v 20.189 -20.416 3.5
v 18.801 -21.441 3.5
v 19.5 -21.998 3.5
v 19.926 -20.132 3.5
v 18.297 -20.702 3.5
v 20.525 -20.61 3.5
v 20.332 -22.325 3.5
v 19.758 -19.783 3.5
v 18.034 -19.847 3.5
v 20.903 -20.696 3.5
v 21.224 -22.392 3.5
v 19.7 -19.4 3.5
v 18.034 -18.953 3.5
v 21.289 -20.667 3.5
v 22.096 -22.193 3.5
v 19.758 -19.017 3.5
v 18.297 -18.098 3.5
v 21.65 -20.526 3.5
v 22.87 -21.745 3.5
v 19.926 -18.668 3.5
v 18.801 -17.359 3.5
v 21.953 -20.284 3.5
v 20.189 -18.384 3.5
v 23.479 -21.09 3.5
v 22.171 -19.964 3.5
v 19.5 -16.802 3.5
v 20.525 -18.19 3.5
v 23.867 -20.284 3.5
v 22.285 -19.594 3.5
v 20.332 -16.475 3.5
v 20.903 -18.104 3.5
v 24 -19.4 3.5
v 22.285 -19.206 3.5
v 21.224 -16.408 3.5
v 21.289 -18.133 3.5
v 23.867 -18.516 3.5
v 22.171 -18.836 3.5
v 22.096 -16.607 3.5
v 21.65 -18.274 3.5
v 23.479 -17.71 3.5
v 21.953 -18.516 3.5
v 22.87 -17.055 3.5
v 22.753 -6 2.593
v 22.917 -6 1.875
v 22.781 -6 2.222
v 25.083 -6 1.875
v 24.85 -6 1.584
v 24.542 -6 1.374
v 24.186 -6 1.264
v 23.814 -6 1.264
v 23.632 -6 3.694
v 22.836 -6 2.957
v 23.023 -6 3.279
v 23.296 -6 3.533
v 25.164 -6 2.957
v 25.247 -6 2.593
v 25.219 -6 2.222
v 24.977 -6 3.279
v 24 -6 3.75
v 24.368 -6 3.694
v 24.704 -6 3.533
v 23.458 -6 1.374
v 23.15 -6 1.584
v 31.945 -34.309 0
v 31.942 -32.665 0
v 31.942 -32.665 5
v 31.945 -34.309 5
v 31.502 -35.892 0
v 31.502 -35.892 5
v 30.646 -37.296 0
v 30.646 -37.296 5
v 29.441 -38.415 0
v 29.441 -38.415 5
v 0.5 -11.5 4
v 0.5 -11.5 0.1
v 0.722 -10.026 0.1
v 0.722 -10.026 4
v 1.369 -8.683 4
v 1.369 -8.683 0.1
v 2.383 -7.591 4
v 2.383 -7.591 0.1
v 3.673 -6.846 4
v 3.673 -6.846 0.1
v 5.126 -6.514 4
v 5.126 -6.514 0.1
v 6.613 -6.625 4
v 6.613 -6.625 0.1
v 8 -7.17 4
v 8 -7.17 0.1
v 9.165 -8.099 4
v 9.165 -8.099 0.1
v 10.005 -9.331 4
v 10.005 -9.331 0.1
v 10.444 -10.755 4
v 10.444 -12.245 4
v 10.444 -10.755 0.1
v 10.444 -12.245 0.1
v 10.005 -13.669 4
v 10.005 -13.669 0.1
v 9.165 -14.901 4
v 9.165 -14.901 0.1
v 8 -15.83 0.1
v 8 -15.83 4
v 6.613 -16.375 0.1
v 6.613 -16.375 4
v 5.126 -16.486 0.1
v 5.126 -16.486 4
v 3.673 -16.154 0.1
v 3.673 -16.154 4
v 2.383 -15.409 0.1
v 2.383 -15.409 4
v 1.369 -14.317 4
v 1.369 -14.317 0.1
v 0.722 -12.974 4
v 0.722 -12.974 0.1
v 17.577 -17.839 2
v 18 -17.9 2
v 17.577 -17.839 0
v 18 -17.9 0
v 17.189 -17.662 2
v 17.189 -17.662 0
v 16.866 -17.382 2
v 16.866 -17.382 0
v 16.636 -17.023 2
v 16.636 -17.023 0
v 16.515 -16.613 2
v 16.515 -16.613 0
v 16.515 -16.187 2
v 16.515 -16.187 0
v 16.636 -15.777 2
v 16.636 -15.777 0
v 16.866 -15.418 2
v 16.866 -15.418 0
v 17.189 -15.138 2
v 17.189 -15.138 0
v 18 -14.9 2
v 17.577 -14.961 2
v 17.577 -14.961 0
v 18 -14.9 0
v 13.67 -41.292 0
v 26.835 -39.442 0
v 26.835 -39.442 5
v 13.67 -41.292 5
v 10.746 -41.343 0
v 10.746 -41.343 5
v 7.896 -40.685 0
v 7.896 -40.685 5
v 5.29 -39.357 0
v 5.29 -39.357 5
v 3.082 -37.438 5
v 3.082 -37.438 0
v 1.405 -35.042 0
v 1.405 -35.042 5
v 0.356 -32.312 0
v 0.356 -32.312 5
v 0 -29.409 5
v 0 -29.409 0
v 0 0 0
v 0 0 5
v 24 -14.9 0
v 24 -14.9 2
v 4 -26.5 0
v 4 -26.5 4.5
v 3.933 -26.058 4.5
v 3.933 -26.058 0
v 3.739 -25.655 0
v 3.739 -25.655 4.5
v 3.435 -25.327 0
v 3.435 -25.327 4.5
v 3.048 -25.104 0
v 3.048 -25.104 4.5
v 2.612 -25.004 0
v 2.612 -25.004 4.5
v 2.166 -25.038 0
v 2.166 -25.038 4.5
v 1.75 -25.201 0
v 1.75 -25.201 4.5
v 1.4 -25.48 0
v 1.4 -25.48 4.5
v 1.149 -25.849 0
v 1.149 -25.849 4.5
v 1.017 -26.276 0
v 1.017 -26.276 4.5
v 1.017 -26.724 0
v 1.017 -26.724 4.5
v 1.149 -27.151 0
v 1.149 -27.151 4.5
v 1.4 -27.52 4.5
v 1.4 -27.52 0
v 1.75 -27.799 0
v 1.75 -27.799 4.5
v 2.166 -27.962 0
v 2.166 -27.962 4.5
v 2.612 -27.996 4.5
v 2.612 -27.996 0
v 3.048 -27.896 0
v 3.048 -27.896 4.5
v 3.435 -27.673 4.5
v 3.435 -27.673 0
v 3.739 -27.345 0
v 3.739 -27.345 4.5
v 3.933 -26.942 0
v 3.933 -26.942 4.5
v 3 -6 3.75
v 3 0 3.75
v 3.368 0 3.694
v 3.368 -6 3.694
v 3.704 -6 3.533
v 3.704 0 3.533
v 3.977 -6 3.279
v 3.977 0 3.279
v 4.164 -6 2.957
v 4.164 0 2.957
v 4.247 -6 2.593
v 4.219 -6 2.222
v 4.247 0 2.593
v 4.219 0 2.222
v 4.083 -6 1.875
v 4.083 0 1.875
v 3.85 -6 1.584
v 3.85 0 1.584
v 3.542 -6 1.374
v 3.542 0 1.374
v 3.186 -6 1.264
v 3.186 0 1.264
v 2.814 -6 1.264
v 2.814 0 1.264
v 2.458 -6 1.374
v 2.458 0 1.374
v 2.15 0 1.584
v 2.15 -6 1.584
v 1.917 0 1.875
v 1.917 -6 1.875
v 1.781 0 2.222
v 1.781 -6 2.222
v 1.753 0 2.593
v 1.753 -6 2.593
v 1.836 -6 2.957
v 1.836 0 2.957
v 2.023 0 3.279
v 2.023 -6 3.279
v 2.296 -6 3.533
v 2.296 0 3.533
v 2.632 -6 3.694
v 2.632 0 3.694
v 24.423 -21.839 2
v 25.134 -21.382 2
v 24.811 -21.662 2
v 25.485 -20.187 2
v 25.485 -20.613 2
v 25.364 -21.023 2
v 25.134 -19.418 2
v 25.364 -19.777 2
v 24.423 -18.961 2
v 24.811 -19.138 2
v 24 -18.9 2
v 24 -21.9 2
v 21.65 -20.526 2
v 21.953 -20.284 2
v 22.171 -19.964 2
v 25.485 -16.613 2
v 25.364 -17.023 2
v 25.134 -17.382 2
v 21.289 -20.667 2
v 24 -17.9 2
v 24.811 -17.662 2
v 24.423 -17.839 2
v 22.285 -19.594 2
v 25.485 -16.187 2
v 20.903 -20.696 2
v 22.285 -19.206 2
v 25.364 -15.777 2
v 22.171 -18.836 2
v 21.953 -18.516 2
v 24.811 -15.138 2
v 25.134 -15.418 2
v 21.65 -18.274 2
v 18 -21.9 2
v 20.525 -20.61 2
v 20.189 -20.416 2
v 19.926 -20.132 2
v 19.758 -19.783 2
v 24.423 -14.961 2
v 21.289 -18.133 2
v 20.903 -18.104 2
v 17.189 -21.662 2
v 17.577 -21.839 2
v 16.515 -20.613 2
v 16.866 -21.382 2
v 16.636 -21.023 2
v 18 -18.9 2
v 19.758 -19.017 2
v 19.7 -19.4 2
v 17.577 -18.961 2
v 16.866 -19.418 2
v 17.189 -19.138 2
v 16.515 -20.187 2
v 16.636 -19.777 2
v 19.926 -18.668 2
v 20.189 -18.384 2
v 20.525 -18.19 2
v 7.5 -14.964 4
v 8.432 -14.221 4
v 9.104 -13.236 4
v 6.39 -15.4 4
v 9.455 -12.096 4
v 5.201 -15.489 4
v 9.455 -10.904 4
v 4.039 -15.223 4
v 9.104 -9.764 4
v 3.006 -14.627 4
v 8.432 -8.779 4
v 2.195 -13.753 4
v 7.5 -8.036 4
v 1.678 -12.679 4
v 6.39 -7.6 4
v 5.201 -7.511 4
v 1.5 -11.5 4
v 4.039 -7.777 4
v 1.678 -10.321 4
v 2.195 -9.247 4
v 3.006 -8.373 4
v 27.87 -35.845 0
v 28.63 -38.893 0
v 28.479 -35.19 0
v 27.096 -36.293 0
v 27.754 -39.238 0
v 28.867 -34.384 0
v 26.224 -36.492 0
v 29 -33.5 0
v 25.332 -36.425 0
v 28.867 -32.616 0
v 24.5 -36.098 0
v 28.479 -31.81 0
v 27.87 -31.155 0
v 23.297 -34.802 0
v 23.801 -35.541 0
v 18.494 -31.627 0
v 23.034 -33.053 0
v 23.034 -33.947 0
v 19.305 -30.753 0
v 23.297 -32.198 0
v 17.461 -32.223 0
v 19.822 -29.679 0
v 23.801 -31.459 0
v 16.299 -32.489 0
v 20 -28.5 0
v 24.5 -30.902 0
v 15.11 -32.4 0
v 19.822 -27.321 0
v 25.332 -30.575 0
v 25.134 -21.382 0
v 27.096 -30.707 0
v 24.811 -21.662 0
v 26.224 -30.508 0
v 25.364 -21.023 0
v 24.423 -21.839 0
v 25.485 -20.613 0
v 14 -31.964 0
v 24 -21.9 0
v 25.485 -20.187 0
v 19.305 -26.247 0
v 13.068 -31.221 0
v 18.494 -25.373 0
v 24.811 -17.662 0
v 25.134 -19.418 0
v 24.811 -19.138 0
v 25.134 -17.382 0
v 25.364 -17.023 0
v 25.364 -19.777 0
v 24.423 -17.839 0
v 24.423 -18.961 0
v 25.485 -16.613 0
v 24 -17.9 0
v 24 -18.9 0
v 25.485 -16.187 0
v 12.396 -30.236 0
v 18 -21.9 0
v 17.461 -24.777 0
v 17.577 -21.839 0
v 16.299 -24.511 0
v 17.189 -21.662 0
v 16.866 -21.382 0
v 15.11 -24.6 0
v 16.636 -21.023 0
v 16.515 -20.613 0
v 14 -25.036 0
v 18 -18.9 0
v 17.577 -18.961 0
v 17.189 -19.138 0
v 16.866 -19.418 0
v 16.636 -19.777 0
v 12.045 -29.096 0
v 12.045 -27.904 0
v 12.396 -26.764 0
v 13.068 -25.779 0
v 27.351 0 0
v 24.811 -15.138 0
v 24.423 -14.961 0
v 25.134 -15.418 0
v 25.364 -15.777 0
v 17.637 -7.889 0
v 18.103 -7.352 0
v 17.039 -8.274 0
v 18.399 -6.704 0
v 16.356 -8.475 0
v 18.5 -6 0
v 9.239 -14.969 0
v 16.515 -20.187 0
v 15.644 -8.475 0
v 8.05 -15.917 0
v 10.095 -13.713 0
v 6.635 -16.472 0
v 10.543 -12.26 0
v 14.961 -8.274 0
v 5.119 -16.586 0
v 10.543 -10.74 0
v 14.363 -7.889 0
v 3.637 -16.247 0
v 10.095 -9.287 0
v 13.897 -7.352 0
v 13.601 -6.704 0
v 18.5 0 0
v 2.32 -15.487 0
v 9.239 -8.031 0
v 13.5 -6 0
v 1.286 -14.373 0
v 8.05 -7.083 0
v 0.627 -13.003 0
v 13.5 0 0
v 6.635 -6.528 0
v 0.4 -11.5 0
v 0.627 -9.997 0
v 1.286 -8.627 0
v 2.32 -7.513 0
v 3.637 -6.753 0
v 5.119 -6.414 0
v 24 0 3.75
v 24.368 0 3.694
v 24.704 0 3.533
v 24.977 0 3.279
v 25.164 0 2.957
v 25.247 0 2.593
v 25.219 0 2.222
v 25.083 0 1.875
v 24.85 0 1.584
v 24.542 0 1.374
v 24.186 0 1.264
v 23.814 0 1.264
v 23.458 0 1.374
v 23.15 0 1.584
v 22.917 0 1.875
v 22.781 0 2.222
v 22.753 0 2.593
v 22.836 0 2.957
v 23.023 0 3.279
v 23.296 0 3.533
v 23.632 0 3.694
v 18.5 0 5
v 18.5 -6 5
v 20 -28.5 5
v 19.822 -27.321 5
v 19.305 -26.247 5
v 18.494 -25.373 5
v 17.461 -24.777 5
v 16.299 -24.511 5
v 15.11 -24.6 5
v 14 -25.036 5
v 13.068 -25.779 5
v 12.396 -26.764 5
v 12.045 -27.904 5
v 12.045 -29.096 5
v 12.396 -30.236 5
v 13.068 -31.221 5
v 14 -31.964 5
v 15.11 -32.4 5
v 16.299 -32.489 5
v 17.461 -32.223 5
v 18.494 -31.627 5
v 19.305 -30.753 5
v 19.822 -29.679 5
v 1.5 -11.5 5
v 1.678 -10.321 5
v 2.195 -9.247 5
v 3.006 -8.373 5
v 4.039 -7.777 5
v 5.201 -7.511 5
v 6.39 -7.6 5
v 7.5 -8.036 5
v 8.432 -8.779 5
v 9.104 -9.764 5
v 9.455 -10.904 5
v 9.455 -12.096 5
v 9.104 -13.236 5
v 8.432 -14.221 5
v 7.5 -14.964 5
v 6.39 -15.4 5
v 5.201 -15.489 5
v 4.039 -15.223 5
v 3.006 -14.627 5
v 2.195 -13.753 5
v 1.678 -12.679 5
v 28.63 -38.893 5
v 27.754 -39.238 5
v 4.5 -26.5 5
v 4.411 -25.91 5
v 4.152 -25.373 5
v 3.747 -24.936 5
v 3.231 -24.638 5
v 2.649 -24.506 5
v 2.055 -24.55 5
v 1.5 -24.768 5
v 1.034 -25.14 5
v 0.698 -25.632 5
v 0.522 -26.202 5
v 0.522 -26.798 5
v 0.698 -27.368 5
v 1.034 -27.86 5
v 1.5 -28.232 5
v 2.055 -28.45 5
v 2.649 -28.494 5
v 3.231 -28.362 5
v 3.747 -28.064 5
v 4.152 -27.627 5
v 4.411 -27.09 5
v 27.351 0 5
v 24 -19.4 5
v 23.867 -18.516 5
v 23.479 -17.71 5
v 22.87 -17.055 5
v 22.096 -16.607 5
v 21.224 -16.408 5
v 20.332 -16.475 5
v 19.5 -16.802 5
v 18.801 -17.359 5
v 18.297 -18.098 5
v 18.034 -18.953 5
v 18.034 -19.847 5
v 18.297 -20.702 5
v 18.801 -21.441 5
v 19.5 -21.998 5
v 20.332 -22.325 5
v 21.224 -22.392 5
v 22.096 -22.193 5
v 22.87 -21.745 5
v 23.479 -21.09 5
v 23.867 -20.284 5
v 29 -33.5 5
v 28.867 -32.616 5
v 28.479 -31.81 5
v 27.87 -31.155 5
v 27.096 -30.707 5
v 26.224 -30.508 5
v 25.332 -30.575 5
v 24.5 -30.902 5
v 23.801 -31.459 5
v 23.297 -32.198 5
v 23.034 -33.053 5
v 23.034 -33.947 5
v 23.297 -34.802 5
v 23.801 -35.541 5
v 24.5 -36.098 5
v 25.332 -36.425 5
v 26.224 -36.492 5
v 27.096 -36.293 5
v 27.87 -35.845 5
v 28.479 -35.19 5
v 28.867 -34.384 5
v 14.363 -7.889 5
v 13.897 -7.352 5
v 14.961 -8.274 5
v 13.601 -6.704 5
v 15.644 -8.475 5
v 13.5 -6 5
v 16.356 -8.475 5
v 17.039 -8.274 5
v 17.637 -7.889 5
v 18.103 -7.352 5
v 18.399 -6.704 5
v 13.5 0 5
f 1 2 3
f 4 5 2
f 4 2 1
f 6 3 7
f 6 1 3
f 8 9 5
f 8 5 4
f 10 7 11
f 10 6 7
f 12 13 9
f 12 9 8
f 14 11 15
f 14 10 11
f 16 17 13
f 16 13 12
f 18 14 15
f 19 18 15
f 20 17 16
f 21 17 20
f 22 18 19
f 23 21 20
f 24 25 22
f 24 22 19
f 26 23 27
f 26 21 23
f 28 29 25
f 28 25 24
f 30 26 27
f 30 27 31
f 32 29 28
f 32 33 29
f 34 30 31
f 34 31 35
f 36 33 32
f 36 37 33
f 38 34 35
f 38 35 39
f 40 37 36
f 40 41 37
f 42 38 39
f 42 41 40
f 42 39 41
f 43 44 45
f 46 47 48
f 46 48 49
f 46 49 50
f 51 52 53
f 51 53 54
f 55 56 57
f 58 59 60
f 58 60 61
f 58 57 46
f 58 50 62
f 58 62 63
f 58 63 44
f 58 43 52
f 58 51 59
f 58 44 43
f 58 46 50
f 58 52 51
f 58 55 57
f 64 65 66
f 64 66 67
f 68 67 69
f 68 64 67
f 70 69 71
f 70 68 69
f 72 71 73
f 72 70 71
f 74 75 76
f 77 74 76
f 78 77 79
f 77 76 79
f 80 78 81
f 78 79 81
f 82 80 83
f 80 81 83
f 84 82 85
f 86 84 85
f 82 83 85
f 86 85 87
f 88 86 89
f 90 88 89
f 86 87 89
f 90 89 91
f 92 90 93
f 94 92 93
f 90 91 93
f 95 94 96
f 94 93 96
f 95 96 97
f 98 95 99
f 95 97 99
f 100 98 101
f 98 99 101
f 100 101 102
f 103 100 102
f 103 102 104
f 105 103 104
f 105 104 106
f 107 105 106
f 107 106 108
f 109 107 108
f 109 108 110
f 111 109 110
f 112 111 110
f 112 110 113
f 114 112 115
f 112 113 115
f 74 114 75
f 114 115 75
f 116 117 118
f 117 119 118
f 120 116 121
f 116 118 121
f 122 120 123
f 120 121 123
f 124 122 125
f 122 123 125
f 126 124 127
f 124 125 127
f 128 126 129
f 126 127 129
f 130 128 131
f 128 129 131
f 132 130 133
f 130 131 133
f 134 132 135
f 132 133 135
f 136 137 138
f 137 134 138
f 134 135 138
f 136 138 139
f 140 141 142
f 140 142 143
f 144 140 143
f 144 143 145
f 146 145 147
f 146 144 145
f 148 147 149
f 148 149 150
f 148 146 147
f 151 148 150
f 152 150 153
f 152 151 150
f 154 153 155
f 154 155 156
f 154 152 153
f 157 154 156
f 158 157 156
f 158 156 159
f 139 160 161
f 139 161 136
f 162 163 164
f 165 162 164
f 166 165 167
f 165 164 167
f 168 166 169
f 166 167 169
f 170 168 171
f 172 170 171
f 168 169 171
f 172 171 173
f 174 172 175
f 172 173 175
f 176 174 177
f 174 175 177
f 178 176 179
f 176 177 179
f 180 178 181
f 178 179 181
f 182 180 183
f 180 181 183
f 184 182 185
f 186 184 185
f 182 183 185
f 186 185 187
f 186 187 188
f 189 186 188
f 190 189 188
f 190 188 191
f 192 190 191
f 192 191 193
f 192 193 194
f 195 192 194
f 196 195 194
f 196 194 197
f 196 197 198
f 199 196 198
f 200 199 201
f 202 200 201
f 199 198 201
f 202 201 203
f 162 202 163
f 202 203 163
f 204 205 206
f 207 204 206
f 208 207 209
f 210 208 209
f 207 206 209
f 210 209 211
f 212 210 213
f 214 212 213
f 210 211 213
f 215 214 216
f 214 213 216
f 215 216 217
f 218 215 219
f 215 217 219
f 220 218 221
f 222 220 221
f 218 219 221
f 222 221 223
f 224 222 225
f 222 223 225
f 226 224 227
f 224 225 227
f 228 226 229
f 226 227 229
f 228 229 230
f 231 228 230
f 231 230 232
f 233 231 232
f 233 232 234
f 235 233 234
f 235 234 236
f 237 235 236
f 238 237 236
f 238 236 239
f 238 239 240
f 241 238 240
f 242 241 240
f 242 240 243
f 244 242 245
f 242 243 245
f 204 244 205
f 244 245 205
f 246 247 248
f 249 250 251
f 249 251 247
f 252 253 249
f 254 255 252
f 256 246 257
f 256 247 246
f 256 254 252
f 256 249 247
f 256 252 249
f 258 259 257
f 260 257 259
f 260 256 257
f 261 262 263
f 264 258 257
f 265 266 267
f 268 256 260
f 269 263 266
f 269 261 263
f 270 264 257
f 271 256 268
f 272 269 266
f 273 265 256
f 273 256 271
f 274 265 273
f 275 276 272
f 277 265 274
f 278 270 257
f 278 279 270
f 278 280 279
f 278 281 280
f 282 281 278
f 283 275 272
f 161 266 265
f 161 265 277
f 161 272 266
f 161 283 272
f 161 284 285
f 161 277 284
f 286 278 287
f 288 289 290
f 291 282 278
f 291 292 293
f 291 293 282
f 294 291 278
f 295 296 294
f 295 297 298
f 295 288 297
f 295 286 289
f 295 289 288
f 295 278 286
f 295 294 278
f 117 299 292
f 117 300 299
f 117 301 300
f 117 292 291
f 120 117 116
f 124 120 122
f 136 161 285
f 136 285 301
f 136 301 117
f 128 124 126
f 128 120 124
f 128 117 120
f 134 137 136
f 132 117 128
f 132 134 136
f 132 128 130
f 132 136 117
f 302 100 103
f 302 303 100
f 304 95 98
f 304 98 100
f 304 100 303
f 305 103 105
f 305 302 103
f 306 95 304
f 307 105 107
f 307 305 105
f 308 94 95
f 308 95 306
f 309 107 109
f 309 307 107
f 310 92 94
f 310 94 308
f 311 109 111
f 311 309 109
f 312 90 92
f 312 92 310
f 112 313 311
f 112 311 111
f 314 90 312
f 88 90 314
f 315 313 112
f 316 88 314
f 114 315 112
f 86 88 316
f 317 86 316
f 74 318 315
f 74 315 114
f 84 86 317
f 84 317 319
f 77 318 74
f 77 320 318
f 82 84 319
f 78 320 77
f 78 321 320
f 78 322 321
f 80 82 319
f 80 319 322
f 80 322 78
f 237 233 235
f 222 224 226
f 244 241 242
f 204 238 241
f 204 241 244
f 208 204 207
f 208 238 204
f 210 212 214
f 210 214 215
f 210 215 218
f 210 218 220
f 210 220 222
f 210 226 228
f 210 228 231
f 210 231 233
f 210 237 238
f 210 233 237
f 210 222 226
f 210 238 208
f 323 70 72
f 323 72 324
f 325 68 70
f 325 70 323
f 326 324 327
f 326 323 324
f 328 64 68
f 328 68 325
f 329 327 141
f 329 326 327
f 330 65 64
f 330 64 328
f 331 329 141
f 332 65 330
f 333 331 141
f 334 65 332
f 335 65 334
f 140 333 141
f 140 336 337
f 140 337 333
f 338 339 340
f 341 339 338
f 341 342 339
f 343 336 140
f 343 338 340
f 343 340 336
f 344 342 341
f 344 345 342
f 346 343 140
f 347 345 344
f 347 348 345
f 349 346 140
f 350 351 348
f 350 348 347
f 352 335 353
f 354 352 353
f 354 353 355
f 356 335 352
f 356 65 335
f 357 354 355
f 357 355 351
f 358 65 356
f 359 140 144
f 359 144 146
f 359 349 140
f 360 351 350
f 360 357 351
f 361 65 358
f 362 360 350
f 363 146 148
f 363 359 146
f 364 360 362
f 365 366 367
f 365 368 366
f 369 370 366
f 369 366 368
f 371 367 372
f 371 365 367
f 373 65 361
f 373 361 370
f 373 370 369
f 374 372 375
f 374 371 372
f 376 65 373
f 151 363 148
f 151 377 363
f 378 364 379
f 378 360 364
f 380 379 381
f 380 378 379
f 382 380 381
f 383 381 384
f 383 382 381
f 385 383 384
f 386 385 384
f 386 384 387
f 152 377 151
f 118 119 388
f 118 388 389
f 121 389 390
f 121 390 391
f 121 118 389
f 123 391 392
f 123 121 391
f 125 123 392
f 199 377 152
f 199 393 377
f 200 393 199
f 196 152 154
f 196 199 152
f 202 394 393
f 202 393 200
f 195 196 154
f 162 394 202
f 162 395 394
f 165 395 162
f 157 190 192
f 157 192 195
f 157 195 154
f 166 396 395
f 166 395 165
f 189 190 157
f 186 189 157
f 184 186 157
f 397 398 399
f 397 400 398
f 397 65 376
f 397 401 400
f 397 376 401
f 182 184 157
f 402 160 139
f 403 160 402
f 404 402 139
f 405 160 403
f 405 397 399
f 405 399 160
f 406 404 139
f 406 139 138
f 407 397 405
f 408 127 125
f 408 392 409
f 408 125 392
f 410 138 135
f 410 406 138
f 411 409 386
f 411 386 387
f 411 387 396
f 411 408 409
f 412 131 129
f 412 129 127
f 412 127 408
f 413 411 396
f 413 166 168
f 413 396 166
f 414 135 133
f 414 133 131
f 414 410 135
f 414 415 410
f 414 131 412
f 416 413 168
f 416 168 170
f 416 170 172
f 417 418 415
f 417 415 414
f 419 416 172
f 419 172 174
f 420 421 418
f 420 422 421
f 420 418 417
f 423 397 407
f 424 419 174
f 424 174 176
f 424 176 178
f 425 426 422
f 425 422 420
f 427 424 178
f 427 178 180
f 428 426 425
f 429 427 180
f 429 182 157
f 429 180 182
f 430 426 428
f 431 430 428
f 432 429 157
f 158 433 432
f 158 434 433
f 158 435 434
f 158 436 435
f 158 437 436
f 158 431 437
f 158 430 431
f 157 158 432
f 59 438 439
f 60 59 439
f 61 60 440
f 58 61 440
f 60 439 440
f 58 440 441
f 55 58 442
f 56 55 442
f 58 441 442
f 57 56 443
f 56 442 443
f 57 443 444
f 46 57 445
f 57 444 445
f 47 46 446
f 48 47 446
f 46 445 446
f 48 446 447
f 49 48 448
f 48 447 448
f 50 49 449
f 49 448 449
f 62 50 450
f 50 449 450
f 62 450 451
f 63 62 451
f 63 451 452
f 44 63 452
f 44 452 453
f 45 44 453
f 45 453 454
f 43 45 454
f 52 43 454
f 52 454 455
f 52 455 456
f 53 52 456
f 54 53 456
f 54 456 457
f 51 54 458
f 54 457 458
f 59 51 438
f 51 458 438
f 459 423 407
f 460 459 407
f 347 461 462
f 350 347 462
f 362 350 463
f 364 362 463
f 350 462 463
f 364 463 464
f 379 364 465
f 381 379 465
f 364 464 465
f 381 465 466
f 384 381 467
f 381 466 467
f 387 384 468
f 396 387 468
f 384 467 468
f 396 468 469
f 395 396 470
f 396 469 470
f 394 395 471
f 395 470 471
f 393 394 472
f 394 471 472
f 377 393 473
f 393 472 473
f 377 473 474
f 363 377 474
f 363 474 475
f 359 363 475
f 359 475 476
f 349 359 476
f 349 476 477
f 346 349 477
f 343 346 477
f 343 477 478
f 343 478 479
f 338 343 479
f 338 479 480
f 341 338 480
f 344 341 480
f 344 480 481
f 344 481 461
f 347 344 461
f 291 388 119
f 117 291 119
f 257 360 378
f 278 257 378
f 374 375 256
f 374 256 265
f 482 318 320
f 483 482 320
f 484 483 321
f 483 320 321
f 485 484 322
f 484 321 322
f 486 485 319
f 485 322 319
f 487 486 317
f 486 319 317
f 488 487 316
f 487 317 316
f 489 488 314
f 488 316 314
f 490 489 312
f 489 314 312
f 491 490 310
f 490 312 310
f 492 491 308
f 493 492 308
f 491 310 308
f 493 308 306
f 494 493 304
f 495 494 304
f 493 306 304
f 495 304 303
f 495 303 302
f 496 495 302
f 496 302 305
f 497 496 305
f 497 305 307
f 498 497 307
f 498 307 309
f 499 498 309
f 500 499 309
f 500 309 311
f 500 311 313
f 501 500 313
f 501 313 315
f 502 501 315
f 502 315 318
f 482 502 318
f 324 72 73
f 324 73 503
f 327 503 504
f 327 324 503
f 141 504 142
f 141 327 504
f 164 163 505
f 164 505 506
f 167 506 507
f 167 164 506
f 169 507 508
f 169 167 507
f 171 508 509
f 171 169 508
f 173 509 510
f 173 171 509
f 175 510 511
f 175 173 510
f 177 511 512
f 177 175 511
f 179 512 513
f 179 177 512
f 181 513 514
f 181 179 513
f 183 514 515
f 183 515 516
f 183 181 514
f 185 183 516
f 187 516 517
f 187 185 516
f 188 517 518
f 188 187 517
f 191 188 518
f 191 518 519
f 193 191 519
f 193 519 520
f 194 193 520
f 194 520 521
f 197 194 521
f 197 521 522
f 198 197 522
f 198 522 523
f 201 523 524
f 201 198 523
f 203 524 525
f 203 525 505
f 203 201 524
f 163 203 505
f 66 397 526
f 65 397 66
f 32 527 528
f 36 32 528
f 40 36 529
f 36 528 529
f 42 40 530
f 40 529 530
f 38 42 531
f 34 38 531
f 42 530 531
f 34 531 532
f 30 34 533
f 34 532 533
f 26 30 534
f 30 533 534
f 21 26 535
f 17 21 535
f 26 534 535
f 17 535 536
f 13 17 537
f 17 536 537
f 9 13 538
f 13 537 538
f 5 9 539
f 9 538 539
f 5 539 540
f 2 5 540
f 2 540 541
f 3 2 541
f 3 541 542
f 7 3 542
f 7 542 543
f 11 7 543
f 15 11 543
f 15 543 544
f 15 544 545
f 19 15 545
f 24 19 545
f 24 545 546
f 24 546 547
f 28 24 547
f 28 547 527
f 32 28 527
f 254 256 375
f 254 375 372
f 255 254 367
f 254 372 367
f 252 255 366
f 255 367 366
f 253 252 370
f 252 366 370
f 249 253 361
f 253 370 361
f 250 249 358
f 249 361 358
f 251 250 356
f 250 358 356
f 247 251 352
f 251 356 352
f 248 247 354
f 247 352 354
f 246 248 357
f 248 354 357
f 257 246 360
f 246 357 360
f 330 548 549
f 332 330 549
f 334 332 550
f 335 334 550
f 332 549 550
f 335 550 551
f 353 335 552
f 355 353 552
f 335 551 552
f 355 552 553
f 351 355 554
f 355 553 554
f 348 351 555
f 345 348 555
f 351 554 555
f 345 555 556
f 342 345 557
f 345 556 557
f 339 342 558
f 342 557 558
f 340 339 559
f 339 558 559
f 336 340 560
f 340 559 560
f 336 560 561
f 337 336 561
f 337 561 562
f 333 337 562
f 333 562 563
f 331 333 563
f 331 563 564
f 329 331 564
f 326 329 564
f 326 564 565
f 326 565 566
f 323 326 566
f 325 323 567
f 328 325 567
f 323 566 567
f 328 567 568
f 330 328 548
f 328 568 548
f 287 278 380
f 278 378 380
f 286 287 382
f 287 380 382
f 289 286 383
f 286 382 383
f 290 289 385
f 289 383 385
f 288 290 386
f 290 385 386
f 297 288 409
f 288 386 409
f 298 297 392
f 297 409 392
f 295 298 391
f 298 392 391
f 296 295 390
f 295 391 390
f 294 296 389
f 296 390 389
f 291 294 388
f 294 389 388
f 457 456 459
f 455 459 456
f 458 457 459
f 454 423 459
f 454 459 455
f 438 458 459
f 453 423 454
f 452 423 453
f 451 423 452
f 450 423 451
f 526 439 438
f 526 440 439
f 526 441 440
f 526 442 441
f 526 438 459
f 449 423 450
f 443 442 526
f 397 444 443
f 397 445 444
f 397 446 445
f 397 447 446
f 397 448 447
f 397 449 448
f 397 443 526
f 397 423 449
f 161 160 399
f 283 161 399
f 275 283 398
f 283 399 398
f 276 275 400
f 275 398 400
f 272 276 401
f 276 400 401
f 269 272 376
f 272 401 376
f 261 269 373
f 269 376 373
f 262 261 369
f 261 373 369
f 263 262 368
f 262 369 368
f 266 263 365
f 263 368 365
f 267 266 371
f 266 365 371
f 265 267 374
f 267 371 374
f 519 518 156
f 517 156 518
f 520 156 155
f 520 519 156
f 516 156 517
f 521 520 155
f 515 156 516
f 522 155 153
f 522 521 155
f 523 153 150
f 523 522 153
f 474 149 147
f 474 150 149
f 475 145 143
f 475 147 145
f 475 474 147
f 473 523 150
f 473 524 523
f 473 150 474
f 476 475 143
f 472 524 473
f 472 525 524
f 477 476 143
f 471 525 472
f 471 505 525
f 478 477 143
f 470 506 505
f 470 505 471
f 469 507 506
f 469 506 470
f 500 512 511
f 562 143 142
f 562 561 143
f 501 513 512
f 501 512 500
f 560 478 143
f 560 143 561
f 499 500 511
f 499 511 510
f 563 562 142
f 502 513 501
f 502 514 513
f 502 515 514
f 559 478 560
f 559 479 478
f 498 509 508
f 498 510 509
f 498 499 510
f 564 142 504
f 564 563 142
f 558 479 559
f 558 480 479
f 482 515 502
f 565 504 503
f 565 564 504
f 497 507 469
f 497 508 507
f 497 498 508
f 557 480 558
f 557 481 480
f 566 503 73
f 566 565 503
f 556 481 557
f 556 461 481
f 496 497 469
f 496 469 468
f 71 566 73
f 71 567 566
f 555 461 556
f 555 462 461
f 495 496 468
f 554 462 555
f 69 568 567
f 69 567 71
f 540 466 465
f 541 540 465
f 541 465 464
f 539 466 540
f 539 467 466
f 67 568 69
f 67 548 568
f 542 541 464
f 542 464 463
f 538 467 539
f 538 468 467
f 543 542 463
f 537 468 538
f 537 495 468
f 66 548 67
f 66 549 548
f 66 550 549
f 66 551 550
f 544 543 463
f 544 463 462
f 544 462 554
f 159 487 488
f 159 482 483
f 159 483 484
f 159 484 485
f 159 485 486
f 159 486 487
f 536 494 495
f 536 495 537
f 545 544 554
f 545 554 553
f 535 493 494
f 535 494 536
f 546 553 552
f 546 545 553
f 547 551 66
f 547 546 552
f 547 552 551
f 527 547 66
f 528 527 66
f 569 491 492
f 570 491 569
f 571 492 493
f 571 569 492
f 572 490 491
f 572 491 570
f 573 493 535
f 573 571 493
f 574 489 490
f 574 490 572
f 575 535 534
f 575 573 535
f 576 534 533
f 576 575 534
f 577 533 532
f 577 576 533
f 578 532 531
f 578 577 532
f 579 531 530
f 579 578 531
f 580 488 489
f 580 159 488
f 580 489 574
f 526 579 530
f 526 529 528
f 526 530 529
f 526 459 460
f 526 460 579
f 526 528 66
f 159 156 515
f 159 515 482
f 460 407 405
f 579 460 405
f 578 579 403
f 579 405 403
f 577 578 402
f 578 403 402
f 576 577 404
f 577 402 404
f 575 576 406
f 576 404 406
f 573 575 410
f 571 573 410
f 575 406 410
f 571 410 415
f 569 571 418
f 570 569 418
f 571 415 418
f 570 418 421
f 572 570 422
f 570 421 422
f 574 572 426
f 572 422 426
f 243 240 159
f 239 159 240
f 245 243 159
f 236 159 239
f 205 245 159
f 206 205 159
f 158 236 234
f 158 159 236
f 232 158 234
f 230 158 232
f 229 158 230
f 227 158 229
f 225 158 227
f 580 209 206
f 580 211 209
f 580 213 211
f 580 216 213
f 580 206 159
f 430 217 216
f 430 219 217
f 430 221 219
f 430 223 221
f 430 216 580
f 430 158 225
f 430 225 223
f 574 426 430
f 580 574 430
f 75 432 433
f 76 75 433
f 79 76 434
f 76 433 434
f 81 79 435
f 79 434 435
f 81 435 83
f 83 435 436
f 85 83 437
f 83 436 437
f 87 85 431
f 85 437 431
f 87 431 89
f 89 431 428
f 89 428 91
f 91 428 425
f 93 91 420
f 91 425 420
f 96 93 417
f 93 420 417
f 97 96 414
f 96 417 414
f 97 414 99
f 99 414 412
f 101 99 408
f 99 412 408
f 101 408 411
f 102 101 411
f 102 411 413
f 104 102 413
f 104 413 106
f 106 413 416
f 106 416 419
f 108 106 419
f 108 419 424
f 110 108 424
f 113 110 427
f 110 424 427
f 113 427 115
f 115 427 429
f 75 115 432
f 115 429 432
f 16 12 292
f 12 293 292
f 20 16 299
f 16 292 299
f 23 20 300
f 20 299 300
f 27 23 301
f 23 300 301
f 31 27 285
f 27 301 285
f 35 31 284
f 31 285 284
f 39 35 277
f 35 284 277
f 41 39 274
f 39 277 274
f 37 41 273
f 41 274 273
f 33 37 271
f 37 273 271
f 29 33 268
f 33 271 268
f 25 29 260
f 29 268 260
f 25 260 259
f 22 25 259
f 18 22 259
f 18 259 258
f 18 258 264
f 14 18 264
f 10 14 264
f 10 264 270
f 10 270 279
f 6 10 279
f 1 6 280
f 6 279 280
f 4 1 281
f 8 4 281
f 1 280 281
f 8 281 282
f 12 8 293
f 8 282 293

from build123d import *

# Parameters (mm, degrees)
SKETCH_1_W                = 34
SKETCH_1_H                = 39.5
EXTRUDE_1_DEPTH           = 5
FILLET_1_R                = 12
SKETCH_2_R                = 3
CUT_EXTRUDE_2_DEPTH       = 5
SKETCH_3_R                = 4
CUT_EXTRUDE_3_DEPTH       = 5
SKETCH_4_R                = 5
CUT_EXTRUDE_4_DEPTH       = 4
CUT_EXTRUDE_5_DEPTH       = 10
EXTRUDE1_START            = -5
EXTRUDE1_DEPTH            = 5
SKETCH_8_R                = 1.5
CUT_EXTRUDE_6_DEPTH       = 4.5
SKETCH9_R                 = 0.5
EXTRUDE5_DEPTH            = 53.525447848
CUT_EXTRUDE_7_DEPTH       = 0.5
SKETCH_13_R               = 4
CUT_EXTRUDE_8_DEPTH       = 10
SKETCH2_W                 = 6
SKETCH2_H                 = 7
EXTRUDE2_DEPTH            = 2
HOLE_WIZARD_1_D           = 2.6
HOLE_WIZARD_1_CBORE_D     = 6
HOLE_WIZARD_1_CBORE_DEPTH = 1.5
SKETCH7_R                 = 1.5
EXTRUDE3_DEPTH            = 2
EXTRUDE4_DEPTH            = 53.570644581
SKETCH10_R                = 1.5
EXTRUDE6_DEPTH            = 10
CHAMFER_5_SIZE            = 0.1
SKETCH_22_R               = 1.5
EXTRUDE_1_2_DEPTH         = 5
CHAMFER_6_SIZE            = 0.5
SKETCH_5_R                = 1.25
CUT_EXTRUDE_1_DEPTH       = 6


with BuildPart() as part:
    # 草图1 → Extrude 1 (new body)
    with BuildSketch(Plane.XY):
        with Locations((17, -19.75)):
            Rectangle(SKETCH_1_W, SKETCH_1_H)
    extrude(amount=EXTRUDE_1_DEPTH)

    # 圆角1
    fillet_1_edges = [part.edges().sort_by_distance(p)[0] for p in [
        (0, -39.5, 2.5),
    ]]
    fillet(fillet_1_edges, radius=FILLET_1_R)

    # 草图2 → 拉伸2 (cut)
    with BuildSketch(Plane.XY.offset(5)):
        with Locations((26, -33.5)):
            Circle(SKETCH_2_R)
    extrude(amount=-CUT_EXTRUDE_2_DEPTH, mode=Mode.SUBTRACT)

    # 草图3 → 拉伸3 (cut)
    with BuildSketch(Plane(origin=(0, 0, 0), x_dir=(-1, 0, 0), z_dir=(0, 0, -1))):
        with Locations((-5.5, -11.5)):
            Circle(SKETCH_3_R)
    extrude(amount=-CUT_EXTRUDE_3_DEPTH, mode=Mode.SUBTRACT)

    # 草图4 → 拉伸4 (cut)
    with BuildSketch(Plane(origin=(0, 0, 0), x_dir=(-1, 0, 0), z_dir=(0, 0, -1))):
        with Locations((-5.5, -11.5)):
            Circle(SKETCH_4_R)
    extrude(amount=-CUT_EXTRUDE_4_DEPTH, mode=Mode.SUBTRACT)

    # 草图7 → 拉伸5 (cut)
    with BuildSketch(Plane(origin=(0, 0, 0), x_dir=(-1, 0, 0), z_dir=(0, 0, -1))):
        with BuildLine():
            Line((-26, -39.5), (-34, -39.5))
            Line((-34, -39.5), (-34, 0))
            Line((-34, 0), (-27.350847473, 0))
            Line((-27.350847473, 0), (-31.941608412, -32.664961394))
            ThreePointArc((-31.941608412, -32.664961394), (-30.528257481, -37.436354174), (-26, -39.5))
        make_face()
    extrude(amount=-CUT_EXTRUDE_5_DEPTH, mode=Mode.SUBTRACT)

    # Sketch1 → Extrude1 (add)
    with BuildSketch(Plane.XY.offset(5).offset(EXTRUDE1_START)):
        with BuildLine():
            Line((26.835038606, -39.441608412), (13.670077212, -41.291823076))
            ThreePointArc((13.670077212, -41.291823076), (4.127291652, -38.465121213), (0, -29.408606251))
            Line((0, -29.408606251), (0, -26.519790857))
            Line((0, -26.519790857), (29.441458618, -38.414912266))
            ThreePointArc((29.441458618, -38.414912266), (28.19900736, -39.082505408), (26.835038606, -39.441608412))
        make_face()
    extrude(amount=EXTRUDE1_DEPTH)

    # 草图8 → 拉伸6 (cut)
    with BuildSketch(Plane.XY.offset(5)):
        with Locations((2.5, -26.5)):
            Circle(SKETCH_8_R)
    extrude(amount=-CUT_EXTRUDE_6_DEPTH, mode=Mode.SUBTRACT)

    # Sketch9 → Extrude5 (cut, through all)
    with BuildSketch(Plane.XY.offset(0.5)):
        with Locations((1.5, -26.5)):
            Circle(SKETCH9_R)
    extrude(amount=-EXTRUDE5_DEPTH, mode=Mode.SUBTRACT)

    # 草图9 → 拉伸7 (cut)
    with BuildSketch(Plane.XY.offset(5)):
        with BuildLine():
            Line((0.25, -26.5), (0.25, -22.5))
            ThreePointArc((0.25, -22.5), (2.5, -20.25), (4.75, -22.5))
            Line((4.75, -22.5), (4.75, -26.5))
            ThreePointArc((4.75, -26.5), (2.5, -28.75), (0.25, -26.5))
        make_face()
    extrude(amount=-CUT_EXTRUDE_7_DEPTH, mode=Mode.SUBTRACT)

    # 草图13 → 拉伸8 (cut)
    with BuildSketch(Plane.XY.offset(5)):
        with Locations((16, -28.5)):
            Circle(SKETCH_13_R)
    extrude(amount=-CUT_EXTRUDE_8_DEPTH, mode=Mode.SUBTRACT)

    # Sketch2 → Extrude2 (cut)
    with BuildSketch(Plane(origin=(0, 0, 0), x_dir=(-1, 0, 0), z_dir=(0, 0, -1))):
        with Locations((-21, -18.4)):
            Rectangle(SKETCH2_W, SKETCH2_H)
    extrude(amount=-EXTRUDE2_DEPTH, mode=Mode.SUBTRACT)

    # 打孔尺寸(%根据)内六角圆柱头螺钉的类型1 (through all)
    with Locations(Plane(origin=(21, -19.4, 5), x_dir=(1, 0, 0), z_dir=(0, 0, 1))):
        with Locations((0, 0)):
            CounterBoreHole(HOLE_WIZARD_1_D / 2, HOLE_WIZARD_1_CBORE_D / 2, HOLE_WIZARD_1_CBORE_DEPTH)

    # Sketch7 → Extrude3 (cut)
    with BuildSketch(Plane(origin=(0, 0, 0), x_dir=(-1, 0, 0), z_dir=(0, 0, -1))):
        with Locations((-24, -16.4)):
            Circle(SKETCH7_R)
        with Locations((-18, -16.4)):
            Circle(SKETCH7_R)
        with Locations((-24, -20.4)):
            Circle(SKETCH7_R)
        with Locations((-18, -20.4)):
            Circle(SKETCH7_R)
    extrude(amount=-EXTRUDE3_DEPTH, mode=Mode.SUBTRACT)

    # Sketch8 → Extrude4 (cut, through all)
    with BuildSketch(Plane(origin=(0, 0, 0), x_dir=(-1, 0, 0), z_dir=(0, 0, -1))):
        with BuildLine():
            Line((-13.5, -6), (-13.5, 0))
            Line((-13.5, 0), (-18.5, 0))
            Line((-18.5, 0), (-18.5, -6))
            ThreePointArc((-18.5, -6), (-16, -8.5), (-13.5, -6))
        make_face()
    extrude(amount=-EXTRUDE4_DEPTH, mode=Mode.SUBTRACT)

    # Sketch10 → Extrude6 (cut)
    with BuildSketch(Plane.XY.offset(4.5)):
        with Locations((2.5, -26.5)):
            Circle(SKETCH10_R)
    extrude(amount=-EXTRUDE6_DEPTH, mode=Mode.SUBTRACT)

    # 倒角5
    chamfer_5_edges = [part.edges().sort_by_distance(p)[0] for p in [
        (10.5, -11.5, 0),
    ]]
    chamfer(chamfer_5_edges, length=CHAMFER_5_SIZE)

    # 草图22 → Extrude 1 2 (add)
    with BuildSketch(Plane.XY.offset(5)):
        with BuildLine():
            Line((4.75, -26.5), (4.75, -22.5))
            ThreePointArc((4.75, -22.5), (2.5, -20.25), (0.25, -22.5))
            Line((0.25, -22.5), (0.25, -26.5))
            ThreePointArc((0.25, -26.5), (2.5, -28.75), (4.75, -26.5))
        make_face()
        with Locations((2.5, -26.5)):
            Circle(SKETCH_22_R, mode=Mode.SUBTRACT)
    extrude(amount=-EXTRUDE_1_2_DEPTH)

    # 倒角6
    chamfer_6_edges = [part.edges().sort_by_distance(p)[0] for p in [
        (1, -26.5, 5),
    ]]
    chamfer(chamfer_6_edges, length=CHAMFER_6_SIZE)

    # 草图5 → 切除-拉伸1 (cut)
    with BuildSketch(Plane(origin=(0, 0, 0), x_dir=(1, 0, 0), z_dir=(0, 1, 0))):
        with Locations(Location((24, -2.5, 0), (0, 0, 270))):
            Circle(SKETCH_5_R)
        with Locations(Location((3, -2.5, 0), (0, 0, 270))):
            Circle(SKETCH_5_R)
    extrude(amount=-CUT_EXTRUDE_1_DEPTH, mode=Mode.SUBTRACT)


solid = part.part
